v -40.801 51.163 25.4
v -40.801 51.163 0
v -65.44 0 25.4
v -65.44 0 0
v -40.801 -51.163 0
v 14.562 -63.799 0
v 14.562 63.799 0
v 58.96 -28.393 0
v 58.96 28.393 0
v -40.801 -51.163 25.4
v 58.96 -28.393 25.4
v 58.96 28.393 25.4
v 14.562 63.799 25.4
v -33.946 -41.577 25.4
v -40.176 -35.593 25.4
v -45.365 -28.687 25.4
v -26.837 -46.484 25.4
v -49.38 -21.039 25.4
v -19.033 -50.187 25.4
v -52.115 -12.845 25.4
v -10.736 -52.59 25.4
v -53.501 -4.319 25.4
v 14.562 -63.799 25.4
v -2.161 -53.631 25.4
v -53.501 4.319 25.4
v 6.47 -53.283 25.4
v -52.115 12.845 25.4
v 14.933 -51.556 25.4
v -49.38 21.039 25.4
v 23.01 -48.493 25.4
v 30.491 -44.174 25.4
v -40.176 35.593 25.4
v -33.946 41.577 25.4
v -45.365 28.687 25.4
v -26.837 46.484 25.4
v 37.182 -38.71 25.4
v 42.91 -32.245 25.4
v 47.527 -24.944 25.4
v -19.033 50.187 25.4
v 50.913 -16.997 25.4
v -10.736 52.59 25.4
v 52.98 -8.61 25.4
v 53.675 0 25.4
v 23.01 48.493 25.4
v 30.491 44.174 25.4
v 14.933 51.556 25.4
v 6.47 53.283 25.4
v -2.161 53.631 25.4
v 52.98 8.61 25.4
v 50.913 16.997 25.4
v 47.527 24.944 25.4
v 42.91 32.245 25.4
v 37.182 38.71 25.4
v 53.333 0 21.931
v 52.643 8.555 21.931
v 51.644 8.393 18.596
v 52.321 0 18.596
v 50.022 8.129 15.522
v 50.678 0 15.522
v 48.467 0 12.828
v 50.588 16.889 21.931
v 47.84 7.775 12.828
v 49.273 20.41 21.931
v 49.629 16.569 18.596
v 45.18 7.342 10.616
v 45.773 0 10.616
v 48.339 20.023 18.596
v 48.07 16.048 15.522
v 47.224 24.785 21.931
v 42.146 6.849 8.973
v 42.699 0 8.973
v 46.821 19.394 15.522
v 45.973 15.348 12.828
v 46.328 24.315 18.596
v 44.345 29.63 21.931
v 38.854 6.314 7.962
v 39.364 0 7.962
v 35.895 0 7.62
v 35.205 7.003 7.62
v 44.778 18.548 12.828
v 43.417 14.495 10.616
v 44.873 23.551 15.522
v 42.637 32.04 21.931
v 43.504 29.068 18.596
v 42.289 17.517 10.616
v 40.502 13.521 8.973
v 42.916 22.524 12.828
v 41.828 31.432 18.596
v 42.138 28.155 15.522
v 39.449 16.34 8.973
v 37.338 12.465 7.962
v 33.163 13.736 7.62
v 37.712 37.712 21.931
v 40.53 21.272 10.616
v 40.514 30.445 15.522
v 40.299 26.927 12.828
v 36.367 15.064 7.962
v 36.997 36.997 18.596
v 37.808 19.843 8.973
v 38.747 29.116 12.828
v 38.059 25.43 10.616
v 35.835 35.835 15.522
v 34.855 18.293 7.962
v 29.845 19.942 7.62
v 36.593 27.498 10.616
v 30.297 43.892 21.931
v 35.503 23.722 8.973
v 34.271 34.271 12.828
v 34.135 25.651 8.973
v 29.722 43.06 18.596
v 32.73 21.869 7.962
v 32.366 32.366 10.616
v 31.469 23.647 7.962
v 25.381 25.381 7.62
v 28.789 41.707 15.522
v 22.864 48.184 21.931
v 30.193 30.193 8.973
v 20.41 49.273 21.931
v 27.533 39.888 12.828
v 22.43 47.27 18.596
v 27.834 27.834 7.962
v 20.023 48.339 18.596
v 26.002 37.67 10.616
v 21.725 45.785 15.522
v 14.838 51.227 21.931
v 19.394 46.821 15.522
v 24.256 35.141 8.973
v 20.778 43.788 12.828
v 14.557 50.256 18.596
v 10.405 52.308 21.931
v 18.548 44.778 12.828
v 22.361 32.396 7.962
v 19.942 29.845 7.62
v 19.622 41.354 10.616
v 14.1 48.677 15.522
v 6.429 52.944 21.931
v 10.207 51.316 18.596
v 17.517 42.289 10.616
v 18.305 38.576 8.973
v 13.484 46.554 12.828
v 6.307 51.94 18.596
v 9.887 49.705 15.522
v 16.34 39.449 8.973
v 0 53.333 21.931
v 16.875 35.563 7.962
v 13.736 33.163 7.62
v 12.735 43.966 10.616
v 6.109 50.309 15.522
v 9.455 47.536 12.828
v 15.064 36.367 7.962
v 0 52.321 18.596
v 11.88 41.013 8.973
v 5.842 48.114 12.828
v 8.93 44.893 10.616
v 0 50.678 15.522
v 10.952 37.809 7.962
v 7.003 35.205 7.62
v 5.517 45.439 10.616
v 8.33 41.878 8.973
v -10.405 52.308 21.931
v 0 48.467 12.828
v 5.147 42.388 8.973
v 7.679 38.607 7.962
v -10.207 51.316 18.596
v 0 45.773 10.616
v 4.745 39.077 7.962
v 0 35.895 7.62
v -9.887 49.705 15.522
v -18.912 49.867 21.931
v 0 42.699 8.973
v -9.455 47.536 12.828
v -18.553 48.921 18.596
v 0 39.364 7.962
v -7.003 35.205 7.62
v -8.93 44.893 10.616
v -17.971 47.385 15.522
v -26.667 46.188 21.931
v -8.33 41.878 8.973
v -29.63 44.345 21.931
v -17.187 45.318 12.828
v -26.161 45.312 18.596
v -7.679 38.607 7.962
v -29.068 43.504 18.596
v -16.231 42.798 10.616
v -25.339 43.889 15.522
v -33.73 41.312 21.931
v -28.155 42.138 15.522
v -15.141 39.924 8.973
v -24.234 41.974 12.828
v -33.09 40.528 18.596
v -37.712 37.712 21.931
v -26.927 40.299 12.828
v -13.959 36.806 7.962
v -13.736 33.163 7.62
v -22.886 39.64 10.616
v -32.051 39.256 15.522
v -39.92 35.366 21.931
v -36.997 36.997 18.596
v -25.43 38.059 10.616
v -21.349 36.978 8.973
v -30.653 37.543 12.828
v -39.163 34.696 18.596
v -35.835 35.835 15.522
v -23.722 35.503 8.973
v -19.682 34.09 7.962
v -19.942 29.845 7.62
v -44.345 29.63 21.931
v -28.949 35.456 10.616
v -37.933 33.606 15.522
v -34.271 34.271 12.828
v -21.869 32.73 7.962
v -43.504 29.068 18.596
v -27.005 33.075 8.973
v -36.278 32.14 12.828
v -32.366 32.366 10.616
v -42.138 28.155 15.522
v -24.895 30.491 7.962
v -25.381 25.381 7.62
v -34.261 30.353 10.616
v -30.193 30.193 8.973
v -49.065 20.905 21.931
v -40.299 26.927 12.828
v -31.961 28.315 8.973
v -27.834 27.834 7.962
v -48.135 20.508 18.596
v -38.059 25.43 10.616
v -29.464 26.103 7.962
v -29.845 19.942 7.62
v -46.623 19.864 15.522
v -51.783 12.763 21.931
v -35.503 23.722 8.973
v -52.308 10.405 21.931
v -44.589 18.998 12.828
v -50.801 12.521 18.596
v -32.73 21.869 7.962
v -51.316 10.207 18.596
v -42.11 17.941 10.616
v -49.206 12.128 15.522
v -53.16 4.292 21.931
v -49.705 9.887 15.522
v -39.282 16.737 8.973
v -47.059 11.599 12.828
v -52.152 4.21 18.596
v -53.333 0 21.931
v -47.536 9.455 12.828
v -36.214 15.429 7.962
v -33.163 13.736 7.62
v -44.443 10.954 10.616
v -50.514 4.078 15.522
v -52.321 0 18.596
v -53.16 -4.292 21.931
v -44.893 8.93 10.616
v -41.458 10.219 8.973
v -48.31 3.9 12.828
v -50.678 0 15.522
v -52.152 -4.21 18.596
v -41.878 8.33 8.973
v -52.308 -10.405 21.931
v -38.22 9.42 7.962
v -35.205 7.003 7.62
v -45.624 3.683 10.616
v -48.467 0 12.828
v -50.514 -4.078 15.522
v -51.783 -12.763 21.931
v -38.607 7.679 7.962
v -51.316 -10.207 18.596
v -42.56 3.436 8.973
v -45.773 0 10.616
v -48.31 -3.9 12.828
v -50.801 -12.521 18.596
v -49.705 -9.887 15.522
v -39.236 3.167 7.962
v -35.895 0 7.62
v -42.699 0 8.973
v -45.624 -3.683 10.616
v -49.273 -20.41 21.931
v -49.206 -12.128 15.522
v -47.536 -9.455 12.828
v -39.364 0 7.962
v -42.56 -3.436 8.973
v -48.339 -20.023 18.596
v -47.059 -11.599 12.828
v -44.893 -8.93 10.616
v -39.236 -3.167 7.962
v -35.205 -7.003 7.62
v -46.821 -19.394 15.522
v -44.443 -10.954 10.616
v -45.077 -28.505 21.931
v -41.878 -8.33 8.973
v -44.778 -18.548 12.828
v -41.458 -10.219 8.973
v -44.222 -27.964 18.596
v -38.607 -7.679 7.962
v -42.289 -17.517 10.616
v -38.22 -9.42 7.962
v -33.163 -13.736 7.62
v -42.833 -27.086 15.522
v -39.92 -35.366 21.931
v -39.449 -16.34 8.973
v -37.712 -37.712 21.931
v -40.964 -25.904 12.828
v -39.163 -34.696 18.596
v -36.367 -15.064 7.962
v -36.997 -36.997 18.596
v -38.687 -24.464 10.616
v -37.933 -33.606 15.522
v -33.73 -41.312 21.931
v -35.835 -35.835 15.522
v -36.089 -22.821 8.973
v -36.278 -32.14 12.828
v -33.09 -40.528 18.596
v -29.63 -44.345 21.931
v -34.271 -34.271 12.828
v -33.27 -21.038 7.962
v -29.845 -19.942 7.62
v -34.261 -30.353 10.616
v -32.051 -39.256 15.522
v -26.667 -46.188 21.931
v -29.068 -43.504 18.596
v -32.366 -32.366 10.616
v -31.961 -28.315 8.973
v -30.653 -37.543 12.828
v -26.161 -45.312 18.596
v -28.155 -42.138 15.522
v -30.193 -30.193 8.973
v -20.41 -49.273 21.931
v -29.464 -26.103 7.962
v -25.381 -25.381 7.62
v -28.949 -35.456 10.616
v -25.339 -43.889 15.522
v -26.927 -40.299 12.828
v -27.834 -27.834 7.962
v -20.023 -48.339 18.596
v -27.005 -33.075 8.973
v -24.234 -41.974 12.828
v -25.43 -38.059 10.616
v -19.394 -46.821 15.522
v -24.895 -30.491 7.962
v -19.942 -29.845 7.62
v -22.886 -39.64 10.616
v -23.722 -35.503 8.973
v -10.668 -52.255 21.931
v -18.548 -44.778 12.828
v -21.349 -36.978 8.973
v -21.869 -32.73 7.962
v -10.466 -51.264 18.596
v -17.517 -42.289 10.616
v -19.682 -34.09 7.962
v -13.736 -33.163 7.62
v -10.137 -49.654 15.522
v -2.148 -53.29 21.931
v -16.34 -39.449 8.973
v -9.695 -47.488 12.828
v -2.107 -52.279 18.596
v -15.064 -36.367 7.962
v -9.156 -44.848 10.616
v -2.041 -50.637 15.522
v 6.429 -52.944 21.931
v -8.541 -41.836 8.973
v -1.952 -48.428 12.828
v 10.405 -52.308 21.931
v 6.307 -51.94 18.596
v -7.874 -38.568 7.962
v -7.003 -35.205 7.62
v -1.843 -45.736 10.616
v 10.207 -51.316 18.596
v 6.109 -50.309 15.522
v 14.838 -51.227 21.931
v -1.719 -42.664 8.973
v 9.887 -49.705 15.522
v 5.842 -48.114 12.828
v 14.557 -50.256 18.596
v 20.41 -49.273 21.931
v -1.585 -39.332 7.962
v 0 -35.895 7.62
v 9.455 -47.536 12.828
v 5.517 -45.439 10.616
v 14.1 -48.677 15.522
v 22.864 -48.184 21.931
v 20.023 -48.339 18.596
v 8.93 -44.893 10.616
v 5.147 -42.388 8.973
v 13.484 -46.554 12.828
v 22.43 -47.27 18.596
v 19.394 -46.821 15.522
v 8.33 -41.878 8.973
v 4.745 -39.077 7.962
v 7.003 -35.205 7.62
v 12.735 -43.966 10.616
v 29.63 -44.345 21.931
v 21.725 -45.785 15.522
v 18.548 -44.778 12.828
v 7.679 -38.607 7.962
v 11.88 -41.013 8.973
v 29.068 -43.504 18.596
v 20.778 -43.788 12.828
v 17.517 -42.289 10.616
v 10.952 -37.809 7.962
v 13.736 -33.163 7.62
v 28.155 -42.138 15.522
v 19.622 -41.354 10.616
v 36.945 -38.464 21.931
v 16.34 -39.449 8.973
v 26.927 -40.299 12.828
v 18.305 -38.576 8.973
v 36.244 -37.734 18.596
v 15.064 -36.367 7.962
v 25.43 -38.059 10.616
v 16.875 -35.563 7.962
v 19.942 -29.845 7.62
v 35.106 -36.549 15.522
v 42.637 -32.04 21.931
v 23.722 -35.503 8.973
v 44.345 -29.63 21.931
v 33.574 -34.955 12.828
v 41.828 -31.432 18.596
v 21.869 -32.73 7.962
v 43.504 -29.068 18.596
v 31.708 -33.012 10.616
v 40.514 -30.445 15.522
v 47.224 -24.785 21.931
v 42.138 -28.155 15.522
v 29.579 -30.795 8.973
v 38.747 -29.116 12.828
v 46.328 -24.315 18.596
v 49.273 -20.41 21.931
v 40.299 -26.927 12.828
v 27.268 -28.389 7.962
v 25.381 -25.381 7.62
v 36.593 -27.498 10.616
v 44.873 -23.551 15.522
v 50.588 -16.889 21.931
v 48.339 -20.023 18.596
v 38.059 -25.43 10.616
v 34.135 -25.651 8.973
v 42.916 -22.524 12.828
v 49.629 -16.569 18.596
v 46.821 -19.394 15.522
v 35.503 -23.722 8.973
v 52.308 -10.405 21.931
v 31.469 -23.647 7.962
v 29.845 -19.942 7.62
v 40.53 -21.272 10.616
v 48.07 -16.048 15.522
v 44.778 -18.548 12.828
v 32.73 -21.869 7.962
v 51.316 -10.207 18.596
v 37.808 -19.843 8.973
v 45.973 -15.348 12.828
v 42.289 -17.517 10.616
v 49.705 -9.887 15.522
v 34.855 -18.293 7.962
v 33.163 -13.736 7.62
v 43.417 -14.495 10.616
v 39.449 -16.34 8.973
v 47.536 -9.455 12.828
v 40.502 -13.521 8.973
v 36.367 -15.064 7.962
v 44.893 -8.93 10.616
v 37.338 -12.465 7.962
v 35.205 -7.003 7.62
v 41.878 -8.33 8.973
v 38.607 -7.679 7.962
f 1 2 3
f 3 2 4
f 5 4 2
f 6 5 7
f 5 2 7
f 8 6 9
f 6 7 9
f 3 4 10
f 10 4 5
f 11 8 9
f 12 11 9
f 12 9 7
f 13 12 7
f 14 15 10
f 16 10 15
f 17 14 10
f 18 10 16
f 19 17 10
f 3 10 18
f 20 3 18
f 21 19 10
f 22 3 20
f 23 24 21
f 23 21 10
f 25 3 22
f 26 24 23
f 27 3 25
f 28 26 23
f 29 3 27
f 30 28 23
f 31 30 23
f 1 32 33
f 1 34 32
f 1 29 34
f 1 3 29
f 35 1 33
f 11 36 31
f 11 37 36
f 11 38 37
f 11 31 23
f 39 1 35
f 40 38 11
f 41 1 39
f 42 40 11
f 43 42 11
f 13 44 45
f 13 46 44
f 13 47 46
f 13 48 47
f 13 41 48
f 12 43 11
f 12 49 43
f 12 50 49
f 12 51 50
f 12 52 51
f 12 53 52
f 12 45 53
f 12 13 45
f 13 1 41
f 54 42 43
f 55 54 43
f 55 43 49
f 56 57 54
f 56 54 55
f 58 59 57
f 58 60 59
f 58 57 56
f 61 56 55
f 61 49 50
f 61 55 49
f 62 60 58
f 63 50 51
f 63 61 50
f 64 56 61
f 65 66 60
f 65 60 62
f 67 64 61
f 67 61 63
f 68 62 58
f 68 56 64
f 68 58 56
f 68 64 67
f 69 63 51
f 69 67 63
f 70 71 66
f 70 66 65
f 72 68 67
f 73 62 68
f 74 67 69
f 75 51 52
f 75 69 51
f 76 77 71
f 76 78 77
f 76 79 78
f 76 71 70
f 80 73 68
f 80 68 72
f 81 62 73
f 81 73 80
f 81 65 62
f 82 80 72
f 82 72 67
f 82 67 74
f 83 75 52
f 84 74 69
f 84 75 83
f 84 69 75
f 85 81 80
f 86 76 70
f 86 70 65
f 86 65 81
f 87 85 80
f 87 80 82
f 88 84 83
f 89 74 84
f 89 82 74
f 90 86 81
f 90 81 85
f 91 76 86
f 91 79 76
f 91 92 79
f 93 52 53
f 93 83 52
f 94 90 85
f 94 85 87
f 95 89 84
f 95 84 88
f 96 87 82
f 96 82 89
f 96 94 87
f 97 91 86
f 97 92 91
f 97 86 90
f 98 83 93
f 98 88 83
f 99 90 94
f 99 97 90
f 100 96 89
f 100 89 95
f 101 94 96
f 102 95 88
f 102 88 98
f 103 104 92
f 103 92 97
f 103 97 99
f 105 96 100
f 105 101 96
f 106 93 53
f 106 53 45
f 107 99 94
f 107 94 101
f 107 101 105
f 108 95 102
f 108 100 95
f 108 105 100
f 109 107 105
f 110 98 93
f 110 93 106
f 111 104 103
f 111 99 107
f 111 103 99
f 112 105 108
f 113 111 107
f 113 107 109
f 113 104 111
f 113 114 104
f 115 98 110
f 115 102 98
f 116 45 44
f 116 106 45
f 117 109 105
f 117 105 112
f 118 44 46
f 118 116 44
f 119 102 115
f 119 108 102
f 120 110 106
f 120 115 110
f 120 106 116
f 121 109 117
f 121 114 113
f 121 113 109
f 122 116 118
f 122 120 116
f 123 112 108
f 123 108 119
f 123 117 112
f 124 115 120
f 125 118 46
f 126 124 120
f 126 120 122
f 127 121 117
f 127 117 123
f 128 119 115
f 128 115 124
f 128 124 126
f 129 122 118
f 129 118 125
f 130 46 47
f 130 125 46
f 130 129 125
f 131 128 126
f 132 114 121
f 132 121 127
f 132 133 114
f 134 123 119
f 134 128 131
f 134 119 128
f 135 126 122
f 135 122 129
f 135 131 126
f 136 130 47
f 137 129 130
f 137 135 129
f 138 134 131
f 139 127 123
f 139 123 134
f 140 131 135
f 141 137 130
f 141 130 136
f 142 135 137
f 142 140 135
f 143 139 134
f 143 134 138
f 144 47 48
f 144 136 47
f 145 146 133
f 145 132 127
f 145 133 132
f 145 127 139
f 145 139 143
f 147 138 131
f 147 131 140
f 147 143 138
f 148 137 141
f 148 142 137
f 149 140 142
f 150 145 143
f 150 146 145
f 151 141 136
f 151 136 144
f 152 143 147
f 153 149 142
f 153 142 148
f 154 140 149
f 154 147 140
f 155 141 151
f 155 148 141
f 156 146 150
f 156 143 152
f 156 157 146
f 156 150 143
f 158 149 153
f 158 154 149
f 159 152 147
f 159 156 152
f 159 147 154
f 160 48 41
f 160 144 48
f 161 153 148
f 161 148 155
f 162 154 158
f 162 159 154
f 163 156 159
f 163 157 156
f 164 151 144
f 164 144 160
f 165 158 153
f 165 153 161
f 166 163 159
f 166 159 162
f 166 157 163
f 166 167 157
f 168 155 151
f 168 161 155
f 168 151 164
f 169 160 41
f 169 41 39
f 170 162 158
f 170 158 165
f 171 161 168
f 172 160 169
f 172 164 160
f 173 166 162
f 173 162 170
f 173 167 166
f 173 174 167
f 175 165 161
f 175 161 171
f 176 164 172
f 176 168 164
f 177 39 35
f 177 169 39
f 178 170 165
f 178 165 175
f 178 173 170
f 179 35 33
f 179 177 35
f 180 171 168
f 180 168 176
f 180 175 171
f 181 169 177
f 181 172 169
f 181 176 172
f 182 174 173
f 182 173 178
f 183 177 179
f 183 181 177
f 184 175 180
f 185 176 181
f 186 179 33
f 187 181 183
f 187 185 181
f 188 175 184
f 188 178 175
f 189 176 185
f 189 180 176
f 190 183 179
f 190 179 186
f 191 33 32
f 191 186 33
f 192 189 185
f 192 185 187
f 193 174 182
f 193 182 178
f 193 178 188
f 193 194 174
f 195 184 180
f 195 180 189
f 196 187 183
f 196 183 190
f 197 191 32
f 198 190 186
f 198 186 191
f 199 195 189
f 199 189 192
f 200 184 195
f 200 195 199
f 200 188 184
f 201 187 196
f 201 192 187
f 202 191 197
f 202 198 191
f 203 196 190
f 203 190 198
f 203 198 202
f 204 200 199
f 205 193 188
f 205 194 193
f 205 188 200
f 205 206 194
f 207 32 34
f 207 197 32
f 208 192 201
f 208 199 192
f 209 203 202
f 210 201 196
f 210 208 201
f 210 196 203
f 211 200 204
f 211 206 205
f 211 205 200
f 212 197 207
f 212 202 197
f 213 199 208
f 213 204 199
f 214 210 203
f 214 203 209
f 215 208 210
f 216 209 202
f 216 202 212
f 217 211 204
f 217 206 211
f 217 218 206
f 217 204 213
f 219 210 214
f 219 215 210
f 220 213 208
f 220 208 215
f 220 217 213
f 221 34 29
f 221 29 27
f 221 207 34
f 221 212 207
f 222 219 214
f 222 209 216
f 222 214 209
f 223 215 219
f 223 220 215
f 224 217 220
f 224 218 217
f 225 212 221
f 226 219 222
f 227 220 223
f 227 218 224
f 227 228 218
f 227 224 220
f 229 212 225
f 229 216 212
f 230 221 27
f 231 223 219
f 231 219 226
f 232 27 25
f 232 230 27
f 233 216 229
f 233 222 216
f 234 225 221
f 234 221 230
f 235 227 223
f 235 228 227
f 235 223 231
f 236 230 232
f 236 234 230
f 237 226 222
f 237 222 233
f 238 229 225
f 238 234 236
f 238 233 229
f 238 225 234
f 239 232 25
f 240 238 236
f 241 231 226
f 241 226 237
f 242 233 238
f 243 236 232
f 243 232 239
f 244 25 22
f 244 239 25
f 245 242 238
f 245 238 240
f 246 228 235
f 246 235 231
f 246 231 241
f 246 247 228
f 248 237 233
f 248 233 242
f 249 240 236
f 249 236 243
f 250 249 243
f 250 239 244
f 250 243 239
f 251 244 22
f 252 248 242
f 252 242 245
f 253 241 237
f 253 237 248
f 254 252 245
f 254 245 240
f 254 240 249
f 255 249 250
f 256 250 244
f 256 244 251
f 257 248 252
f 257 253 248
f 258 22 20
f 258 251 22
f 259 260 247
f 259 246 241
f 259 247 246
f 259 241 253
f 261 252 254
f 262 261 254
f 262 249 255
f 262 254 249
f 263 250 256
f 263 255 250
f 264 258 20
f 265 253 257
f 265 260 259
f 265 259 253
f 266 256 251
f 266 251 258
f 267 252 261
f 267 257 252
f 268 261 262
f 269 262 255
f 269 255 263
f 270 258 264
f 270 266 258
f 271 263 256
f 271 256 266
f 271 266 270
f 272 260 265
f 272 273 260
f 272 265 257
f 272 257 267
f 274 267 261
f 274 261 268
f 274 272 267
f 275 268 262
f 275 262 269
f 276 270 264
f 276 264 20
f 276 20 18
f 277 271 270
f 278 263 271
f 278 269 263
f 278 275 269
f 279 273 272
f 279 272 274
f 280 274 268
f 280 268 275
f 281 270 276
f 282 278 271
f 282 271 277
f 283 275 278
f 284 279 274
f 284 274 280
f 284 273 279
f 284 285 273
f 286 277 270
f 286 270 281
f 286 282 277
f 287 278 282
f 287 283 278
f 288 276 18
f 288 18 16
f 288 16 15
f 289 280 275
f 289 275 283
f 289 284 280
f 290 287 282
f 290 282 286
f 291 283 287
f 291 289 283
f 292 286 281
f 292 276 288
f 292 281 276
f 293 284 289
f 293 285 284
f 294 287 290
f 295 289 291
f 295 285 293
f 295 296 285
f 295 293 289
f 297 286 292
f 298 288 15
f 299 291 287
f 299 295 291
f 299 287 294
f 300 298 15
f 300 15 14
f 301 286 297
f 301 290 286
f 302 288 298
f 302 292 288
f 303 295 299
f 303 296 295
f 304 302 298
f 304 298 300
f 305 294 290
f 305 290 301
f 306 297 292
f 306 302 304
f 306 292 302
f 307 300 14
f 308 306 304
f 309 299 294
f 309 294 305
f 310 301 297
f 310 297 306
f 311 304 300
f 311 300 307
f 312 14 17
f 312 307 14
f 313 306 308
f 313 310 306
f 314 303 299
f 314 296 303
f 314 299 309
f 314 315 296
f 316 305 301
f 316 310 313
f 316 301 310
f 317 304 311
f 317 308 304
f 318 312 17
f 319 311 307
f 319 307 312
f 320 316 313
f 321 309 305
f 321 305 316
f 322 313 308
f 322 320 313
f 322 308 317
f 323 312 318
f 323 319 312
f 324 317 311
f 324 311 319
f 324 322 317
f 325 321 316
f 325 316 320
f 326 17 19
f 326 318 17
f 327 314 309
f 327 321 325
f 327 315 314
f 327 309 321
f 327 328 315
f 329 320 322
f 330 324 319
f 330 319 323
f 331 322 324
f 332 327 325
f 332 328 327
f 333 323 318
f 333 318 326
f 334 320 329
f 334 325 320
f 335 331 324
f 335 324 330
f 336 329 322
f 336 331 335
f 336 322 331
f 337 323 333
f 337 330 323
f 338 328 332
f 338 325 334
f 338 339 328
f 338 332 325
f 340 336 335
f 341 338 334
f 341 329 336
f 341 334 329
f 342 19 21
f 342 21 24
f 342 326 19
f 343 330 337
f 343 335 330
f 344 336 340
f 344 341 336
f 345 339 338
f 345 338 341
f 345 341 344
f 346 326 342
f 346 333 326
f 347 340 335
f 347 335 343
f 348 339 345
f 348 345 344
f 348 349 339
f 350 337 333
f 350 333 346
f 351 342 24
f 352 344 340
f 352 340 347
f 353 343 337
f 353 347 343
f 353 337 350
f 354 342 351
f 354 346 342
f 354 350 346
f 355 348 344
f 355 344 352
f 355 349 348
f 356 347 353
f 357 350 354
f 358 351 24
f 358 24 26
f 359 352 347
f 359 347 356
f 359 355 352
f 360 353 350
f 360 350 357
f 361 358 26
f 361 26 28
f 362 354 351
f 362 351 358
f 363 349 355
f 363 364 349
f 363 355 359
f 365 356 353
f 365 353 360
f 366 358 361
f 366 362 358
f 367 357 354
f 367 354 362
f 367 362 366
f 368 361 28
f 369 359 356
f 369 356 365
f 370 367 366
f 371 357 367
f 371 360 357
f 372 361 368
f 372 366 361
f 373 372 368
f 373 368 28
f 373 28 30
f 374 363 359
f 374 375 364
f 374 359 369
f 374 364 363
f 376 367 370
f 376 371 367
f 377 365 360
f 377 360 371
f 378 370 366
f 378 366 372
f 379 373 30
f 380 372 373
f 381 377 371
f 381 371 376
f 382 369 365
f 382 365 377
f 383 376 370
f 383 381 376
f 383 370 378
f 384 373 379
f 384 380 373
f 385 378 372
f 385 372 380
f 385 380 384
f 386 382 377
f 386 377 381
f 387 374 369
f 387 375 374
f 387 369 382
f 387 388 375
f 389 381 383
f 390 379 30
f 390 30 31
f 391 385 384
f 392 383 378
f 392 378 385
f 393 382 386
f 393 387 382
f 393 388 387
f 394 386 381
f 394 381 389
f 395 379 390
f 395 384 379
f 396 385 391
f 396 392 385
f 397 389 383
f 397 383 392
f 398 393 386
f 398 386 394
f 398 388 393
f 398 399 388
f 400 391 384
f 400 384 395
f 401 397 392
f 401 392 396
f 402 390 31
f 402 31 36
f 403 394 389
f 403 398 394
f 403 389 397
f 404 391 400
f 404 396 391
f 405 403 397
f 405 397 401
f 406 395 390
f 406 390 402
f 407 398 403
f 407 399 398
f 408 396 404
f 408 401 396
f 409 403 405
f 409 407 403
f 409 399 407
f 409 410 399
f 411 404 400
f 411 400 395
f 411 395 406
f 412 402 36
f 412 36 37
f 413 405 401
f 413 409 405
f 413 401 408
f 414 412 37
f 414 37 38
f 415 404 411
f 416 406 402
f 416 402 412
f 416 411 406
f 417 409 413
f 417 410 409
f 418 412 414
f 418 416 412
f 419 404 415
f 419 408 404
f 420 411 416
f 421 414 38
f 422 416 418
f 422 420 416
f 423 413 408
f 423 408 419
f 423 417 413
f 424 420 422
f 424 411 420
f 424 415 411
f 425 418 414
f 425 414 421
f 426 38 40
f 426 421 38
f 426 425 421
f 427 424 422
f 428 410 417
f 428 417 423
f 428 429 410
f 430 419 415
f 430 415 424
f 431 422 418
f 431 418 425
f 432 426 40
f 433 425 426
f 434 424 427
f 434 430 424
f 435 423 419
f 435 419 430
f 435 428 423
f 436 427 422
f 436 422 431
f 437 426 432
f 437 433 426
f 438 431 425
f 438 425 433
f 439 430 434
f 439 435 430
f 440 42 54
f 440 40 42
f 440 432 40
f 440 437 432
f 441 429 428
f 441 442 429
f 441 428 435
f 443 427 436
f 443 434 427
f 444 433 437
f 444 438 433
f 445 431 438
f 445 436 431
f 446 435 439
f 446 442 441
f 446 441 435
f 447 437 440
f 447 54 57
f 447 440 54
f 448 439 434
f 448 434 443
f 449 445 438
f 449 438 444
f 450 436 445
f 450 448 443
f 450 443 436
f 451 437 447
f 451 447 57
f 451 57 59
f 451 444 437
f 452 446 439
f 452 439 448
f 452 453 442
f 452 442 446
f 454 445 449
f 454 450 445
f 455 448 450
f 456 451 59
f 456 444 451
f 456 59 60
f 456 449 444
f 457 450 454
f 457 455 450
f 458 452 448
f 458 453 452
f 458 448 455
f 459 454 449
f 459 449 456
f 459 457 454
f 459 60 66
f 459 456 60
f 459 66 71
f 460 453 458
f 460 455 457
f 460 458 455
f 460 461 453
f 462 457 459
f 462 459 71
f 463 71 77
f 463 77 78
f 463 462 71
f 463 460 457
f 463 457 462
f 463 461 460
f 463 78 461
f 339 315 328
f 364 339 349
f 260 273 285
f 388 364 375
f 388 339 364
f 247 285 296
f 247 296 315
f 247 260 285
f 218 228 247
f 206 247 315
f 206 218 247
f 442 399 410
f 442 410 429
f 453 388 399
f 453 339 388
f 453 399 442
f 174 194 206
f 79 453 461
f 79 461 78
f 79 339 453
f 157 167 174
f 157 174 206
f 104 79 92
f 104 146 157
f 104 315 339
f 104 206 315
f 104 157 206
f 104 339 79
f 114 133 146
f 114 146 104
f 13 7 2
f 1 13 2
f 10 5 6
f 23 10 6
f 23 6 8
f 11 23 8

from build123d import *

# Parameters (mm, degrees)
F1_DEPTH = 25.4
F2_R     = 53.6748278482
F3_DEPTH = 17.78
F4_R     = 17.77999


# Not quite as in the source:
# - a fillet or chamfer is up to 0.001 mm smaller than in the source, because OpenCascade refuses the exact size


with BuildPart() as f1:
    # F0 (on Top) → F1 (new body)
    with BuildSketch(Plane.XY):
        Polygon((58.9595362544, -28.3934161968), (58.9595362544, 28.3934161968), (14.5618028995, 63.799427074), (-40.8012650454, 51.1631680934), (-65.440148217, 0), (-40.8012650454, -51.1631680934), (14.5618028995, -63.799427074), align=None)
    extrude(amount=F1_DEPTH)

    # F2 (on face) → F3 (cut)
    with BuildSketch(Plane.XY.offset(25.4)):
        Circle(F2_R)
    extrude(amount=-F3_DEPTH, mode=Mode.SUBTRACT)

    # F4 (radius 17.78 in the source; OpenCascade refuses exactly that, so slightly less here)
    f4_edges = [f1.edges().sort_by_distance(p)[0] for p in [
        (-53.674828, 0, 7.62),
    ]]
    fillet(f4_edges, radius=F4_R)


solid = f1.part
